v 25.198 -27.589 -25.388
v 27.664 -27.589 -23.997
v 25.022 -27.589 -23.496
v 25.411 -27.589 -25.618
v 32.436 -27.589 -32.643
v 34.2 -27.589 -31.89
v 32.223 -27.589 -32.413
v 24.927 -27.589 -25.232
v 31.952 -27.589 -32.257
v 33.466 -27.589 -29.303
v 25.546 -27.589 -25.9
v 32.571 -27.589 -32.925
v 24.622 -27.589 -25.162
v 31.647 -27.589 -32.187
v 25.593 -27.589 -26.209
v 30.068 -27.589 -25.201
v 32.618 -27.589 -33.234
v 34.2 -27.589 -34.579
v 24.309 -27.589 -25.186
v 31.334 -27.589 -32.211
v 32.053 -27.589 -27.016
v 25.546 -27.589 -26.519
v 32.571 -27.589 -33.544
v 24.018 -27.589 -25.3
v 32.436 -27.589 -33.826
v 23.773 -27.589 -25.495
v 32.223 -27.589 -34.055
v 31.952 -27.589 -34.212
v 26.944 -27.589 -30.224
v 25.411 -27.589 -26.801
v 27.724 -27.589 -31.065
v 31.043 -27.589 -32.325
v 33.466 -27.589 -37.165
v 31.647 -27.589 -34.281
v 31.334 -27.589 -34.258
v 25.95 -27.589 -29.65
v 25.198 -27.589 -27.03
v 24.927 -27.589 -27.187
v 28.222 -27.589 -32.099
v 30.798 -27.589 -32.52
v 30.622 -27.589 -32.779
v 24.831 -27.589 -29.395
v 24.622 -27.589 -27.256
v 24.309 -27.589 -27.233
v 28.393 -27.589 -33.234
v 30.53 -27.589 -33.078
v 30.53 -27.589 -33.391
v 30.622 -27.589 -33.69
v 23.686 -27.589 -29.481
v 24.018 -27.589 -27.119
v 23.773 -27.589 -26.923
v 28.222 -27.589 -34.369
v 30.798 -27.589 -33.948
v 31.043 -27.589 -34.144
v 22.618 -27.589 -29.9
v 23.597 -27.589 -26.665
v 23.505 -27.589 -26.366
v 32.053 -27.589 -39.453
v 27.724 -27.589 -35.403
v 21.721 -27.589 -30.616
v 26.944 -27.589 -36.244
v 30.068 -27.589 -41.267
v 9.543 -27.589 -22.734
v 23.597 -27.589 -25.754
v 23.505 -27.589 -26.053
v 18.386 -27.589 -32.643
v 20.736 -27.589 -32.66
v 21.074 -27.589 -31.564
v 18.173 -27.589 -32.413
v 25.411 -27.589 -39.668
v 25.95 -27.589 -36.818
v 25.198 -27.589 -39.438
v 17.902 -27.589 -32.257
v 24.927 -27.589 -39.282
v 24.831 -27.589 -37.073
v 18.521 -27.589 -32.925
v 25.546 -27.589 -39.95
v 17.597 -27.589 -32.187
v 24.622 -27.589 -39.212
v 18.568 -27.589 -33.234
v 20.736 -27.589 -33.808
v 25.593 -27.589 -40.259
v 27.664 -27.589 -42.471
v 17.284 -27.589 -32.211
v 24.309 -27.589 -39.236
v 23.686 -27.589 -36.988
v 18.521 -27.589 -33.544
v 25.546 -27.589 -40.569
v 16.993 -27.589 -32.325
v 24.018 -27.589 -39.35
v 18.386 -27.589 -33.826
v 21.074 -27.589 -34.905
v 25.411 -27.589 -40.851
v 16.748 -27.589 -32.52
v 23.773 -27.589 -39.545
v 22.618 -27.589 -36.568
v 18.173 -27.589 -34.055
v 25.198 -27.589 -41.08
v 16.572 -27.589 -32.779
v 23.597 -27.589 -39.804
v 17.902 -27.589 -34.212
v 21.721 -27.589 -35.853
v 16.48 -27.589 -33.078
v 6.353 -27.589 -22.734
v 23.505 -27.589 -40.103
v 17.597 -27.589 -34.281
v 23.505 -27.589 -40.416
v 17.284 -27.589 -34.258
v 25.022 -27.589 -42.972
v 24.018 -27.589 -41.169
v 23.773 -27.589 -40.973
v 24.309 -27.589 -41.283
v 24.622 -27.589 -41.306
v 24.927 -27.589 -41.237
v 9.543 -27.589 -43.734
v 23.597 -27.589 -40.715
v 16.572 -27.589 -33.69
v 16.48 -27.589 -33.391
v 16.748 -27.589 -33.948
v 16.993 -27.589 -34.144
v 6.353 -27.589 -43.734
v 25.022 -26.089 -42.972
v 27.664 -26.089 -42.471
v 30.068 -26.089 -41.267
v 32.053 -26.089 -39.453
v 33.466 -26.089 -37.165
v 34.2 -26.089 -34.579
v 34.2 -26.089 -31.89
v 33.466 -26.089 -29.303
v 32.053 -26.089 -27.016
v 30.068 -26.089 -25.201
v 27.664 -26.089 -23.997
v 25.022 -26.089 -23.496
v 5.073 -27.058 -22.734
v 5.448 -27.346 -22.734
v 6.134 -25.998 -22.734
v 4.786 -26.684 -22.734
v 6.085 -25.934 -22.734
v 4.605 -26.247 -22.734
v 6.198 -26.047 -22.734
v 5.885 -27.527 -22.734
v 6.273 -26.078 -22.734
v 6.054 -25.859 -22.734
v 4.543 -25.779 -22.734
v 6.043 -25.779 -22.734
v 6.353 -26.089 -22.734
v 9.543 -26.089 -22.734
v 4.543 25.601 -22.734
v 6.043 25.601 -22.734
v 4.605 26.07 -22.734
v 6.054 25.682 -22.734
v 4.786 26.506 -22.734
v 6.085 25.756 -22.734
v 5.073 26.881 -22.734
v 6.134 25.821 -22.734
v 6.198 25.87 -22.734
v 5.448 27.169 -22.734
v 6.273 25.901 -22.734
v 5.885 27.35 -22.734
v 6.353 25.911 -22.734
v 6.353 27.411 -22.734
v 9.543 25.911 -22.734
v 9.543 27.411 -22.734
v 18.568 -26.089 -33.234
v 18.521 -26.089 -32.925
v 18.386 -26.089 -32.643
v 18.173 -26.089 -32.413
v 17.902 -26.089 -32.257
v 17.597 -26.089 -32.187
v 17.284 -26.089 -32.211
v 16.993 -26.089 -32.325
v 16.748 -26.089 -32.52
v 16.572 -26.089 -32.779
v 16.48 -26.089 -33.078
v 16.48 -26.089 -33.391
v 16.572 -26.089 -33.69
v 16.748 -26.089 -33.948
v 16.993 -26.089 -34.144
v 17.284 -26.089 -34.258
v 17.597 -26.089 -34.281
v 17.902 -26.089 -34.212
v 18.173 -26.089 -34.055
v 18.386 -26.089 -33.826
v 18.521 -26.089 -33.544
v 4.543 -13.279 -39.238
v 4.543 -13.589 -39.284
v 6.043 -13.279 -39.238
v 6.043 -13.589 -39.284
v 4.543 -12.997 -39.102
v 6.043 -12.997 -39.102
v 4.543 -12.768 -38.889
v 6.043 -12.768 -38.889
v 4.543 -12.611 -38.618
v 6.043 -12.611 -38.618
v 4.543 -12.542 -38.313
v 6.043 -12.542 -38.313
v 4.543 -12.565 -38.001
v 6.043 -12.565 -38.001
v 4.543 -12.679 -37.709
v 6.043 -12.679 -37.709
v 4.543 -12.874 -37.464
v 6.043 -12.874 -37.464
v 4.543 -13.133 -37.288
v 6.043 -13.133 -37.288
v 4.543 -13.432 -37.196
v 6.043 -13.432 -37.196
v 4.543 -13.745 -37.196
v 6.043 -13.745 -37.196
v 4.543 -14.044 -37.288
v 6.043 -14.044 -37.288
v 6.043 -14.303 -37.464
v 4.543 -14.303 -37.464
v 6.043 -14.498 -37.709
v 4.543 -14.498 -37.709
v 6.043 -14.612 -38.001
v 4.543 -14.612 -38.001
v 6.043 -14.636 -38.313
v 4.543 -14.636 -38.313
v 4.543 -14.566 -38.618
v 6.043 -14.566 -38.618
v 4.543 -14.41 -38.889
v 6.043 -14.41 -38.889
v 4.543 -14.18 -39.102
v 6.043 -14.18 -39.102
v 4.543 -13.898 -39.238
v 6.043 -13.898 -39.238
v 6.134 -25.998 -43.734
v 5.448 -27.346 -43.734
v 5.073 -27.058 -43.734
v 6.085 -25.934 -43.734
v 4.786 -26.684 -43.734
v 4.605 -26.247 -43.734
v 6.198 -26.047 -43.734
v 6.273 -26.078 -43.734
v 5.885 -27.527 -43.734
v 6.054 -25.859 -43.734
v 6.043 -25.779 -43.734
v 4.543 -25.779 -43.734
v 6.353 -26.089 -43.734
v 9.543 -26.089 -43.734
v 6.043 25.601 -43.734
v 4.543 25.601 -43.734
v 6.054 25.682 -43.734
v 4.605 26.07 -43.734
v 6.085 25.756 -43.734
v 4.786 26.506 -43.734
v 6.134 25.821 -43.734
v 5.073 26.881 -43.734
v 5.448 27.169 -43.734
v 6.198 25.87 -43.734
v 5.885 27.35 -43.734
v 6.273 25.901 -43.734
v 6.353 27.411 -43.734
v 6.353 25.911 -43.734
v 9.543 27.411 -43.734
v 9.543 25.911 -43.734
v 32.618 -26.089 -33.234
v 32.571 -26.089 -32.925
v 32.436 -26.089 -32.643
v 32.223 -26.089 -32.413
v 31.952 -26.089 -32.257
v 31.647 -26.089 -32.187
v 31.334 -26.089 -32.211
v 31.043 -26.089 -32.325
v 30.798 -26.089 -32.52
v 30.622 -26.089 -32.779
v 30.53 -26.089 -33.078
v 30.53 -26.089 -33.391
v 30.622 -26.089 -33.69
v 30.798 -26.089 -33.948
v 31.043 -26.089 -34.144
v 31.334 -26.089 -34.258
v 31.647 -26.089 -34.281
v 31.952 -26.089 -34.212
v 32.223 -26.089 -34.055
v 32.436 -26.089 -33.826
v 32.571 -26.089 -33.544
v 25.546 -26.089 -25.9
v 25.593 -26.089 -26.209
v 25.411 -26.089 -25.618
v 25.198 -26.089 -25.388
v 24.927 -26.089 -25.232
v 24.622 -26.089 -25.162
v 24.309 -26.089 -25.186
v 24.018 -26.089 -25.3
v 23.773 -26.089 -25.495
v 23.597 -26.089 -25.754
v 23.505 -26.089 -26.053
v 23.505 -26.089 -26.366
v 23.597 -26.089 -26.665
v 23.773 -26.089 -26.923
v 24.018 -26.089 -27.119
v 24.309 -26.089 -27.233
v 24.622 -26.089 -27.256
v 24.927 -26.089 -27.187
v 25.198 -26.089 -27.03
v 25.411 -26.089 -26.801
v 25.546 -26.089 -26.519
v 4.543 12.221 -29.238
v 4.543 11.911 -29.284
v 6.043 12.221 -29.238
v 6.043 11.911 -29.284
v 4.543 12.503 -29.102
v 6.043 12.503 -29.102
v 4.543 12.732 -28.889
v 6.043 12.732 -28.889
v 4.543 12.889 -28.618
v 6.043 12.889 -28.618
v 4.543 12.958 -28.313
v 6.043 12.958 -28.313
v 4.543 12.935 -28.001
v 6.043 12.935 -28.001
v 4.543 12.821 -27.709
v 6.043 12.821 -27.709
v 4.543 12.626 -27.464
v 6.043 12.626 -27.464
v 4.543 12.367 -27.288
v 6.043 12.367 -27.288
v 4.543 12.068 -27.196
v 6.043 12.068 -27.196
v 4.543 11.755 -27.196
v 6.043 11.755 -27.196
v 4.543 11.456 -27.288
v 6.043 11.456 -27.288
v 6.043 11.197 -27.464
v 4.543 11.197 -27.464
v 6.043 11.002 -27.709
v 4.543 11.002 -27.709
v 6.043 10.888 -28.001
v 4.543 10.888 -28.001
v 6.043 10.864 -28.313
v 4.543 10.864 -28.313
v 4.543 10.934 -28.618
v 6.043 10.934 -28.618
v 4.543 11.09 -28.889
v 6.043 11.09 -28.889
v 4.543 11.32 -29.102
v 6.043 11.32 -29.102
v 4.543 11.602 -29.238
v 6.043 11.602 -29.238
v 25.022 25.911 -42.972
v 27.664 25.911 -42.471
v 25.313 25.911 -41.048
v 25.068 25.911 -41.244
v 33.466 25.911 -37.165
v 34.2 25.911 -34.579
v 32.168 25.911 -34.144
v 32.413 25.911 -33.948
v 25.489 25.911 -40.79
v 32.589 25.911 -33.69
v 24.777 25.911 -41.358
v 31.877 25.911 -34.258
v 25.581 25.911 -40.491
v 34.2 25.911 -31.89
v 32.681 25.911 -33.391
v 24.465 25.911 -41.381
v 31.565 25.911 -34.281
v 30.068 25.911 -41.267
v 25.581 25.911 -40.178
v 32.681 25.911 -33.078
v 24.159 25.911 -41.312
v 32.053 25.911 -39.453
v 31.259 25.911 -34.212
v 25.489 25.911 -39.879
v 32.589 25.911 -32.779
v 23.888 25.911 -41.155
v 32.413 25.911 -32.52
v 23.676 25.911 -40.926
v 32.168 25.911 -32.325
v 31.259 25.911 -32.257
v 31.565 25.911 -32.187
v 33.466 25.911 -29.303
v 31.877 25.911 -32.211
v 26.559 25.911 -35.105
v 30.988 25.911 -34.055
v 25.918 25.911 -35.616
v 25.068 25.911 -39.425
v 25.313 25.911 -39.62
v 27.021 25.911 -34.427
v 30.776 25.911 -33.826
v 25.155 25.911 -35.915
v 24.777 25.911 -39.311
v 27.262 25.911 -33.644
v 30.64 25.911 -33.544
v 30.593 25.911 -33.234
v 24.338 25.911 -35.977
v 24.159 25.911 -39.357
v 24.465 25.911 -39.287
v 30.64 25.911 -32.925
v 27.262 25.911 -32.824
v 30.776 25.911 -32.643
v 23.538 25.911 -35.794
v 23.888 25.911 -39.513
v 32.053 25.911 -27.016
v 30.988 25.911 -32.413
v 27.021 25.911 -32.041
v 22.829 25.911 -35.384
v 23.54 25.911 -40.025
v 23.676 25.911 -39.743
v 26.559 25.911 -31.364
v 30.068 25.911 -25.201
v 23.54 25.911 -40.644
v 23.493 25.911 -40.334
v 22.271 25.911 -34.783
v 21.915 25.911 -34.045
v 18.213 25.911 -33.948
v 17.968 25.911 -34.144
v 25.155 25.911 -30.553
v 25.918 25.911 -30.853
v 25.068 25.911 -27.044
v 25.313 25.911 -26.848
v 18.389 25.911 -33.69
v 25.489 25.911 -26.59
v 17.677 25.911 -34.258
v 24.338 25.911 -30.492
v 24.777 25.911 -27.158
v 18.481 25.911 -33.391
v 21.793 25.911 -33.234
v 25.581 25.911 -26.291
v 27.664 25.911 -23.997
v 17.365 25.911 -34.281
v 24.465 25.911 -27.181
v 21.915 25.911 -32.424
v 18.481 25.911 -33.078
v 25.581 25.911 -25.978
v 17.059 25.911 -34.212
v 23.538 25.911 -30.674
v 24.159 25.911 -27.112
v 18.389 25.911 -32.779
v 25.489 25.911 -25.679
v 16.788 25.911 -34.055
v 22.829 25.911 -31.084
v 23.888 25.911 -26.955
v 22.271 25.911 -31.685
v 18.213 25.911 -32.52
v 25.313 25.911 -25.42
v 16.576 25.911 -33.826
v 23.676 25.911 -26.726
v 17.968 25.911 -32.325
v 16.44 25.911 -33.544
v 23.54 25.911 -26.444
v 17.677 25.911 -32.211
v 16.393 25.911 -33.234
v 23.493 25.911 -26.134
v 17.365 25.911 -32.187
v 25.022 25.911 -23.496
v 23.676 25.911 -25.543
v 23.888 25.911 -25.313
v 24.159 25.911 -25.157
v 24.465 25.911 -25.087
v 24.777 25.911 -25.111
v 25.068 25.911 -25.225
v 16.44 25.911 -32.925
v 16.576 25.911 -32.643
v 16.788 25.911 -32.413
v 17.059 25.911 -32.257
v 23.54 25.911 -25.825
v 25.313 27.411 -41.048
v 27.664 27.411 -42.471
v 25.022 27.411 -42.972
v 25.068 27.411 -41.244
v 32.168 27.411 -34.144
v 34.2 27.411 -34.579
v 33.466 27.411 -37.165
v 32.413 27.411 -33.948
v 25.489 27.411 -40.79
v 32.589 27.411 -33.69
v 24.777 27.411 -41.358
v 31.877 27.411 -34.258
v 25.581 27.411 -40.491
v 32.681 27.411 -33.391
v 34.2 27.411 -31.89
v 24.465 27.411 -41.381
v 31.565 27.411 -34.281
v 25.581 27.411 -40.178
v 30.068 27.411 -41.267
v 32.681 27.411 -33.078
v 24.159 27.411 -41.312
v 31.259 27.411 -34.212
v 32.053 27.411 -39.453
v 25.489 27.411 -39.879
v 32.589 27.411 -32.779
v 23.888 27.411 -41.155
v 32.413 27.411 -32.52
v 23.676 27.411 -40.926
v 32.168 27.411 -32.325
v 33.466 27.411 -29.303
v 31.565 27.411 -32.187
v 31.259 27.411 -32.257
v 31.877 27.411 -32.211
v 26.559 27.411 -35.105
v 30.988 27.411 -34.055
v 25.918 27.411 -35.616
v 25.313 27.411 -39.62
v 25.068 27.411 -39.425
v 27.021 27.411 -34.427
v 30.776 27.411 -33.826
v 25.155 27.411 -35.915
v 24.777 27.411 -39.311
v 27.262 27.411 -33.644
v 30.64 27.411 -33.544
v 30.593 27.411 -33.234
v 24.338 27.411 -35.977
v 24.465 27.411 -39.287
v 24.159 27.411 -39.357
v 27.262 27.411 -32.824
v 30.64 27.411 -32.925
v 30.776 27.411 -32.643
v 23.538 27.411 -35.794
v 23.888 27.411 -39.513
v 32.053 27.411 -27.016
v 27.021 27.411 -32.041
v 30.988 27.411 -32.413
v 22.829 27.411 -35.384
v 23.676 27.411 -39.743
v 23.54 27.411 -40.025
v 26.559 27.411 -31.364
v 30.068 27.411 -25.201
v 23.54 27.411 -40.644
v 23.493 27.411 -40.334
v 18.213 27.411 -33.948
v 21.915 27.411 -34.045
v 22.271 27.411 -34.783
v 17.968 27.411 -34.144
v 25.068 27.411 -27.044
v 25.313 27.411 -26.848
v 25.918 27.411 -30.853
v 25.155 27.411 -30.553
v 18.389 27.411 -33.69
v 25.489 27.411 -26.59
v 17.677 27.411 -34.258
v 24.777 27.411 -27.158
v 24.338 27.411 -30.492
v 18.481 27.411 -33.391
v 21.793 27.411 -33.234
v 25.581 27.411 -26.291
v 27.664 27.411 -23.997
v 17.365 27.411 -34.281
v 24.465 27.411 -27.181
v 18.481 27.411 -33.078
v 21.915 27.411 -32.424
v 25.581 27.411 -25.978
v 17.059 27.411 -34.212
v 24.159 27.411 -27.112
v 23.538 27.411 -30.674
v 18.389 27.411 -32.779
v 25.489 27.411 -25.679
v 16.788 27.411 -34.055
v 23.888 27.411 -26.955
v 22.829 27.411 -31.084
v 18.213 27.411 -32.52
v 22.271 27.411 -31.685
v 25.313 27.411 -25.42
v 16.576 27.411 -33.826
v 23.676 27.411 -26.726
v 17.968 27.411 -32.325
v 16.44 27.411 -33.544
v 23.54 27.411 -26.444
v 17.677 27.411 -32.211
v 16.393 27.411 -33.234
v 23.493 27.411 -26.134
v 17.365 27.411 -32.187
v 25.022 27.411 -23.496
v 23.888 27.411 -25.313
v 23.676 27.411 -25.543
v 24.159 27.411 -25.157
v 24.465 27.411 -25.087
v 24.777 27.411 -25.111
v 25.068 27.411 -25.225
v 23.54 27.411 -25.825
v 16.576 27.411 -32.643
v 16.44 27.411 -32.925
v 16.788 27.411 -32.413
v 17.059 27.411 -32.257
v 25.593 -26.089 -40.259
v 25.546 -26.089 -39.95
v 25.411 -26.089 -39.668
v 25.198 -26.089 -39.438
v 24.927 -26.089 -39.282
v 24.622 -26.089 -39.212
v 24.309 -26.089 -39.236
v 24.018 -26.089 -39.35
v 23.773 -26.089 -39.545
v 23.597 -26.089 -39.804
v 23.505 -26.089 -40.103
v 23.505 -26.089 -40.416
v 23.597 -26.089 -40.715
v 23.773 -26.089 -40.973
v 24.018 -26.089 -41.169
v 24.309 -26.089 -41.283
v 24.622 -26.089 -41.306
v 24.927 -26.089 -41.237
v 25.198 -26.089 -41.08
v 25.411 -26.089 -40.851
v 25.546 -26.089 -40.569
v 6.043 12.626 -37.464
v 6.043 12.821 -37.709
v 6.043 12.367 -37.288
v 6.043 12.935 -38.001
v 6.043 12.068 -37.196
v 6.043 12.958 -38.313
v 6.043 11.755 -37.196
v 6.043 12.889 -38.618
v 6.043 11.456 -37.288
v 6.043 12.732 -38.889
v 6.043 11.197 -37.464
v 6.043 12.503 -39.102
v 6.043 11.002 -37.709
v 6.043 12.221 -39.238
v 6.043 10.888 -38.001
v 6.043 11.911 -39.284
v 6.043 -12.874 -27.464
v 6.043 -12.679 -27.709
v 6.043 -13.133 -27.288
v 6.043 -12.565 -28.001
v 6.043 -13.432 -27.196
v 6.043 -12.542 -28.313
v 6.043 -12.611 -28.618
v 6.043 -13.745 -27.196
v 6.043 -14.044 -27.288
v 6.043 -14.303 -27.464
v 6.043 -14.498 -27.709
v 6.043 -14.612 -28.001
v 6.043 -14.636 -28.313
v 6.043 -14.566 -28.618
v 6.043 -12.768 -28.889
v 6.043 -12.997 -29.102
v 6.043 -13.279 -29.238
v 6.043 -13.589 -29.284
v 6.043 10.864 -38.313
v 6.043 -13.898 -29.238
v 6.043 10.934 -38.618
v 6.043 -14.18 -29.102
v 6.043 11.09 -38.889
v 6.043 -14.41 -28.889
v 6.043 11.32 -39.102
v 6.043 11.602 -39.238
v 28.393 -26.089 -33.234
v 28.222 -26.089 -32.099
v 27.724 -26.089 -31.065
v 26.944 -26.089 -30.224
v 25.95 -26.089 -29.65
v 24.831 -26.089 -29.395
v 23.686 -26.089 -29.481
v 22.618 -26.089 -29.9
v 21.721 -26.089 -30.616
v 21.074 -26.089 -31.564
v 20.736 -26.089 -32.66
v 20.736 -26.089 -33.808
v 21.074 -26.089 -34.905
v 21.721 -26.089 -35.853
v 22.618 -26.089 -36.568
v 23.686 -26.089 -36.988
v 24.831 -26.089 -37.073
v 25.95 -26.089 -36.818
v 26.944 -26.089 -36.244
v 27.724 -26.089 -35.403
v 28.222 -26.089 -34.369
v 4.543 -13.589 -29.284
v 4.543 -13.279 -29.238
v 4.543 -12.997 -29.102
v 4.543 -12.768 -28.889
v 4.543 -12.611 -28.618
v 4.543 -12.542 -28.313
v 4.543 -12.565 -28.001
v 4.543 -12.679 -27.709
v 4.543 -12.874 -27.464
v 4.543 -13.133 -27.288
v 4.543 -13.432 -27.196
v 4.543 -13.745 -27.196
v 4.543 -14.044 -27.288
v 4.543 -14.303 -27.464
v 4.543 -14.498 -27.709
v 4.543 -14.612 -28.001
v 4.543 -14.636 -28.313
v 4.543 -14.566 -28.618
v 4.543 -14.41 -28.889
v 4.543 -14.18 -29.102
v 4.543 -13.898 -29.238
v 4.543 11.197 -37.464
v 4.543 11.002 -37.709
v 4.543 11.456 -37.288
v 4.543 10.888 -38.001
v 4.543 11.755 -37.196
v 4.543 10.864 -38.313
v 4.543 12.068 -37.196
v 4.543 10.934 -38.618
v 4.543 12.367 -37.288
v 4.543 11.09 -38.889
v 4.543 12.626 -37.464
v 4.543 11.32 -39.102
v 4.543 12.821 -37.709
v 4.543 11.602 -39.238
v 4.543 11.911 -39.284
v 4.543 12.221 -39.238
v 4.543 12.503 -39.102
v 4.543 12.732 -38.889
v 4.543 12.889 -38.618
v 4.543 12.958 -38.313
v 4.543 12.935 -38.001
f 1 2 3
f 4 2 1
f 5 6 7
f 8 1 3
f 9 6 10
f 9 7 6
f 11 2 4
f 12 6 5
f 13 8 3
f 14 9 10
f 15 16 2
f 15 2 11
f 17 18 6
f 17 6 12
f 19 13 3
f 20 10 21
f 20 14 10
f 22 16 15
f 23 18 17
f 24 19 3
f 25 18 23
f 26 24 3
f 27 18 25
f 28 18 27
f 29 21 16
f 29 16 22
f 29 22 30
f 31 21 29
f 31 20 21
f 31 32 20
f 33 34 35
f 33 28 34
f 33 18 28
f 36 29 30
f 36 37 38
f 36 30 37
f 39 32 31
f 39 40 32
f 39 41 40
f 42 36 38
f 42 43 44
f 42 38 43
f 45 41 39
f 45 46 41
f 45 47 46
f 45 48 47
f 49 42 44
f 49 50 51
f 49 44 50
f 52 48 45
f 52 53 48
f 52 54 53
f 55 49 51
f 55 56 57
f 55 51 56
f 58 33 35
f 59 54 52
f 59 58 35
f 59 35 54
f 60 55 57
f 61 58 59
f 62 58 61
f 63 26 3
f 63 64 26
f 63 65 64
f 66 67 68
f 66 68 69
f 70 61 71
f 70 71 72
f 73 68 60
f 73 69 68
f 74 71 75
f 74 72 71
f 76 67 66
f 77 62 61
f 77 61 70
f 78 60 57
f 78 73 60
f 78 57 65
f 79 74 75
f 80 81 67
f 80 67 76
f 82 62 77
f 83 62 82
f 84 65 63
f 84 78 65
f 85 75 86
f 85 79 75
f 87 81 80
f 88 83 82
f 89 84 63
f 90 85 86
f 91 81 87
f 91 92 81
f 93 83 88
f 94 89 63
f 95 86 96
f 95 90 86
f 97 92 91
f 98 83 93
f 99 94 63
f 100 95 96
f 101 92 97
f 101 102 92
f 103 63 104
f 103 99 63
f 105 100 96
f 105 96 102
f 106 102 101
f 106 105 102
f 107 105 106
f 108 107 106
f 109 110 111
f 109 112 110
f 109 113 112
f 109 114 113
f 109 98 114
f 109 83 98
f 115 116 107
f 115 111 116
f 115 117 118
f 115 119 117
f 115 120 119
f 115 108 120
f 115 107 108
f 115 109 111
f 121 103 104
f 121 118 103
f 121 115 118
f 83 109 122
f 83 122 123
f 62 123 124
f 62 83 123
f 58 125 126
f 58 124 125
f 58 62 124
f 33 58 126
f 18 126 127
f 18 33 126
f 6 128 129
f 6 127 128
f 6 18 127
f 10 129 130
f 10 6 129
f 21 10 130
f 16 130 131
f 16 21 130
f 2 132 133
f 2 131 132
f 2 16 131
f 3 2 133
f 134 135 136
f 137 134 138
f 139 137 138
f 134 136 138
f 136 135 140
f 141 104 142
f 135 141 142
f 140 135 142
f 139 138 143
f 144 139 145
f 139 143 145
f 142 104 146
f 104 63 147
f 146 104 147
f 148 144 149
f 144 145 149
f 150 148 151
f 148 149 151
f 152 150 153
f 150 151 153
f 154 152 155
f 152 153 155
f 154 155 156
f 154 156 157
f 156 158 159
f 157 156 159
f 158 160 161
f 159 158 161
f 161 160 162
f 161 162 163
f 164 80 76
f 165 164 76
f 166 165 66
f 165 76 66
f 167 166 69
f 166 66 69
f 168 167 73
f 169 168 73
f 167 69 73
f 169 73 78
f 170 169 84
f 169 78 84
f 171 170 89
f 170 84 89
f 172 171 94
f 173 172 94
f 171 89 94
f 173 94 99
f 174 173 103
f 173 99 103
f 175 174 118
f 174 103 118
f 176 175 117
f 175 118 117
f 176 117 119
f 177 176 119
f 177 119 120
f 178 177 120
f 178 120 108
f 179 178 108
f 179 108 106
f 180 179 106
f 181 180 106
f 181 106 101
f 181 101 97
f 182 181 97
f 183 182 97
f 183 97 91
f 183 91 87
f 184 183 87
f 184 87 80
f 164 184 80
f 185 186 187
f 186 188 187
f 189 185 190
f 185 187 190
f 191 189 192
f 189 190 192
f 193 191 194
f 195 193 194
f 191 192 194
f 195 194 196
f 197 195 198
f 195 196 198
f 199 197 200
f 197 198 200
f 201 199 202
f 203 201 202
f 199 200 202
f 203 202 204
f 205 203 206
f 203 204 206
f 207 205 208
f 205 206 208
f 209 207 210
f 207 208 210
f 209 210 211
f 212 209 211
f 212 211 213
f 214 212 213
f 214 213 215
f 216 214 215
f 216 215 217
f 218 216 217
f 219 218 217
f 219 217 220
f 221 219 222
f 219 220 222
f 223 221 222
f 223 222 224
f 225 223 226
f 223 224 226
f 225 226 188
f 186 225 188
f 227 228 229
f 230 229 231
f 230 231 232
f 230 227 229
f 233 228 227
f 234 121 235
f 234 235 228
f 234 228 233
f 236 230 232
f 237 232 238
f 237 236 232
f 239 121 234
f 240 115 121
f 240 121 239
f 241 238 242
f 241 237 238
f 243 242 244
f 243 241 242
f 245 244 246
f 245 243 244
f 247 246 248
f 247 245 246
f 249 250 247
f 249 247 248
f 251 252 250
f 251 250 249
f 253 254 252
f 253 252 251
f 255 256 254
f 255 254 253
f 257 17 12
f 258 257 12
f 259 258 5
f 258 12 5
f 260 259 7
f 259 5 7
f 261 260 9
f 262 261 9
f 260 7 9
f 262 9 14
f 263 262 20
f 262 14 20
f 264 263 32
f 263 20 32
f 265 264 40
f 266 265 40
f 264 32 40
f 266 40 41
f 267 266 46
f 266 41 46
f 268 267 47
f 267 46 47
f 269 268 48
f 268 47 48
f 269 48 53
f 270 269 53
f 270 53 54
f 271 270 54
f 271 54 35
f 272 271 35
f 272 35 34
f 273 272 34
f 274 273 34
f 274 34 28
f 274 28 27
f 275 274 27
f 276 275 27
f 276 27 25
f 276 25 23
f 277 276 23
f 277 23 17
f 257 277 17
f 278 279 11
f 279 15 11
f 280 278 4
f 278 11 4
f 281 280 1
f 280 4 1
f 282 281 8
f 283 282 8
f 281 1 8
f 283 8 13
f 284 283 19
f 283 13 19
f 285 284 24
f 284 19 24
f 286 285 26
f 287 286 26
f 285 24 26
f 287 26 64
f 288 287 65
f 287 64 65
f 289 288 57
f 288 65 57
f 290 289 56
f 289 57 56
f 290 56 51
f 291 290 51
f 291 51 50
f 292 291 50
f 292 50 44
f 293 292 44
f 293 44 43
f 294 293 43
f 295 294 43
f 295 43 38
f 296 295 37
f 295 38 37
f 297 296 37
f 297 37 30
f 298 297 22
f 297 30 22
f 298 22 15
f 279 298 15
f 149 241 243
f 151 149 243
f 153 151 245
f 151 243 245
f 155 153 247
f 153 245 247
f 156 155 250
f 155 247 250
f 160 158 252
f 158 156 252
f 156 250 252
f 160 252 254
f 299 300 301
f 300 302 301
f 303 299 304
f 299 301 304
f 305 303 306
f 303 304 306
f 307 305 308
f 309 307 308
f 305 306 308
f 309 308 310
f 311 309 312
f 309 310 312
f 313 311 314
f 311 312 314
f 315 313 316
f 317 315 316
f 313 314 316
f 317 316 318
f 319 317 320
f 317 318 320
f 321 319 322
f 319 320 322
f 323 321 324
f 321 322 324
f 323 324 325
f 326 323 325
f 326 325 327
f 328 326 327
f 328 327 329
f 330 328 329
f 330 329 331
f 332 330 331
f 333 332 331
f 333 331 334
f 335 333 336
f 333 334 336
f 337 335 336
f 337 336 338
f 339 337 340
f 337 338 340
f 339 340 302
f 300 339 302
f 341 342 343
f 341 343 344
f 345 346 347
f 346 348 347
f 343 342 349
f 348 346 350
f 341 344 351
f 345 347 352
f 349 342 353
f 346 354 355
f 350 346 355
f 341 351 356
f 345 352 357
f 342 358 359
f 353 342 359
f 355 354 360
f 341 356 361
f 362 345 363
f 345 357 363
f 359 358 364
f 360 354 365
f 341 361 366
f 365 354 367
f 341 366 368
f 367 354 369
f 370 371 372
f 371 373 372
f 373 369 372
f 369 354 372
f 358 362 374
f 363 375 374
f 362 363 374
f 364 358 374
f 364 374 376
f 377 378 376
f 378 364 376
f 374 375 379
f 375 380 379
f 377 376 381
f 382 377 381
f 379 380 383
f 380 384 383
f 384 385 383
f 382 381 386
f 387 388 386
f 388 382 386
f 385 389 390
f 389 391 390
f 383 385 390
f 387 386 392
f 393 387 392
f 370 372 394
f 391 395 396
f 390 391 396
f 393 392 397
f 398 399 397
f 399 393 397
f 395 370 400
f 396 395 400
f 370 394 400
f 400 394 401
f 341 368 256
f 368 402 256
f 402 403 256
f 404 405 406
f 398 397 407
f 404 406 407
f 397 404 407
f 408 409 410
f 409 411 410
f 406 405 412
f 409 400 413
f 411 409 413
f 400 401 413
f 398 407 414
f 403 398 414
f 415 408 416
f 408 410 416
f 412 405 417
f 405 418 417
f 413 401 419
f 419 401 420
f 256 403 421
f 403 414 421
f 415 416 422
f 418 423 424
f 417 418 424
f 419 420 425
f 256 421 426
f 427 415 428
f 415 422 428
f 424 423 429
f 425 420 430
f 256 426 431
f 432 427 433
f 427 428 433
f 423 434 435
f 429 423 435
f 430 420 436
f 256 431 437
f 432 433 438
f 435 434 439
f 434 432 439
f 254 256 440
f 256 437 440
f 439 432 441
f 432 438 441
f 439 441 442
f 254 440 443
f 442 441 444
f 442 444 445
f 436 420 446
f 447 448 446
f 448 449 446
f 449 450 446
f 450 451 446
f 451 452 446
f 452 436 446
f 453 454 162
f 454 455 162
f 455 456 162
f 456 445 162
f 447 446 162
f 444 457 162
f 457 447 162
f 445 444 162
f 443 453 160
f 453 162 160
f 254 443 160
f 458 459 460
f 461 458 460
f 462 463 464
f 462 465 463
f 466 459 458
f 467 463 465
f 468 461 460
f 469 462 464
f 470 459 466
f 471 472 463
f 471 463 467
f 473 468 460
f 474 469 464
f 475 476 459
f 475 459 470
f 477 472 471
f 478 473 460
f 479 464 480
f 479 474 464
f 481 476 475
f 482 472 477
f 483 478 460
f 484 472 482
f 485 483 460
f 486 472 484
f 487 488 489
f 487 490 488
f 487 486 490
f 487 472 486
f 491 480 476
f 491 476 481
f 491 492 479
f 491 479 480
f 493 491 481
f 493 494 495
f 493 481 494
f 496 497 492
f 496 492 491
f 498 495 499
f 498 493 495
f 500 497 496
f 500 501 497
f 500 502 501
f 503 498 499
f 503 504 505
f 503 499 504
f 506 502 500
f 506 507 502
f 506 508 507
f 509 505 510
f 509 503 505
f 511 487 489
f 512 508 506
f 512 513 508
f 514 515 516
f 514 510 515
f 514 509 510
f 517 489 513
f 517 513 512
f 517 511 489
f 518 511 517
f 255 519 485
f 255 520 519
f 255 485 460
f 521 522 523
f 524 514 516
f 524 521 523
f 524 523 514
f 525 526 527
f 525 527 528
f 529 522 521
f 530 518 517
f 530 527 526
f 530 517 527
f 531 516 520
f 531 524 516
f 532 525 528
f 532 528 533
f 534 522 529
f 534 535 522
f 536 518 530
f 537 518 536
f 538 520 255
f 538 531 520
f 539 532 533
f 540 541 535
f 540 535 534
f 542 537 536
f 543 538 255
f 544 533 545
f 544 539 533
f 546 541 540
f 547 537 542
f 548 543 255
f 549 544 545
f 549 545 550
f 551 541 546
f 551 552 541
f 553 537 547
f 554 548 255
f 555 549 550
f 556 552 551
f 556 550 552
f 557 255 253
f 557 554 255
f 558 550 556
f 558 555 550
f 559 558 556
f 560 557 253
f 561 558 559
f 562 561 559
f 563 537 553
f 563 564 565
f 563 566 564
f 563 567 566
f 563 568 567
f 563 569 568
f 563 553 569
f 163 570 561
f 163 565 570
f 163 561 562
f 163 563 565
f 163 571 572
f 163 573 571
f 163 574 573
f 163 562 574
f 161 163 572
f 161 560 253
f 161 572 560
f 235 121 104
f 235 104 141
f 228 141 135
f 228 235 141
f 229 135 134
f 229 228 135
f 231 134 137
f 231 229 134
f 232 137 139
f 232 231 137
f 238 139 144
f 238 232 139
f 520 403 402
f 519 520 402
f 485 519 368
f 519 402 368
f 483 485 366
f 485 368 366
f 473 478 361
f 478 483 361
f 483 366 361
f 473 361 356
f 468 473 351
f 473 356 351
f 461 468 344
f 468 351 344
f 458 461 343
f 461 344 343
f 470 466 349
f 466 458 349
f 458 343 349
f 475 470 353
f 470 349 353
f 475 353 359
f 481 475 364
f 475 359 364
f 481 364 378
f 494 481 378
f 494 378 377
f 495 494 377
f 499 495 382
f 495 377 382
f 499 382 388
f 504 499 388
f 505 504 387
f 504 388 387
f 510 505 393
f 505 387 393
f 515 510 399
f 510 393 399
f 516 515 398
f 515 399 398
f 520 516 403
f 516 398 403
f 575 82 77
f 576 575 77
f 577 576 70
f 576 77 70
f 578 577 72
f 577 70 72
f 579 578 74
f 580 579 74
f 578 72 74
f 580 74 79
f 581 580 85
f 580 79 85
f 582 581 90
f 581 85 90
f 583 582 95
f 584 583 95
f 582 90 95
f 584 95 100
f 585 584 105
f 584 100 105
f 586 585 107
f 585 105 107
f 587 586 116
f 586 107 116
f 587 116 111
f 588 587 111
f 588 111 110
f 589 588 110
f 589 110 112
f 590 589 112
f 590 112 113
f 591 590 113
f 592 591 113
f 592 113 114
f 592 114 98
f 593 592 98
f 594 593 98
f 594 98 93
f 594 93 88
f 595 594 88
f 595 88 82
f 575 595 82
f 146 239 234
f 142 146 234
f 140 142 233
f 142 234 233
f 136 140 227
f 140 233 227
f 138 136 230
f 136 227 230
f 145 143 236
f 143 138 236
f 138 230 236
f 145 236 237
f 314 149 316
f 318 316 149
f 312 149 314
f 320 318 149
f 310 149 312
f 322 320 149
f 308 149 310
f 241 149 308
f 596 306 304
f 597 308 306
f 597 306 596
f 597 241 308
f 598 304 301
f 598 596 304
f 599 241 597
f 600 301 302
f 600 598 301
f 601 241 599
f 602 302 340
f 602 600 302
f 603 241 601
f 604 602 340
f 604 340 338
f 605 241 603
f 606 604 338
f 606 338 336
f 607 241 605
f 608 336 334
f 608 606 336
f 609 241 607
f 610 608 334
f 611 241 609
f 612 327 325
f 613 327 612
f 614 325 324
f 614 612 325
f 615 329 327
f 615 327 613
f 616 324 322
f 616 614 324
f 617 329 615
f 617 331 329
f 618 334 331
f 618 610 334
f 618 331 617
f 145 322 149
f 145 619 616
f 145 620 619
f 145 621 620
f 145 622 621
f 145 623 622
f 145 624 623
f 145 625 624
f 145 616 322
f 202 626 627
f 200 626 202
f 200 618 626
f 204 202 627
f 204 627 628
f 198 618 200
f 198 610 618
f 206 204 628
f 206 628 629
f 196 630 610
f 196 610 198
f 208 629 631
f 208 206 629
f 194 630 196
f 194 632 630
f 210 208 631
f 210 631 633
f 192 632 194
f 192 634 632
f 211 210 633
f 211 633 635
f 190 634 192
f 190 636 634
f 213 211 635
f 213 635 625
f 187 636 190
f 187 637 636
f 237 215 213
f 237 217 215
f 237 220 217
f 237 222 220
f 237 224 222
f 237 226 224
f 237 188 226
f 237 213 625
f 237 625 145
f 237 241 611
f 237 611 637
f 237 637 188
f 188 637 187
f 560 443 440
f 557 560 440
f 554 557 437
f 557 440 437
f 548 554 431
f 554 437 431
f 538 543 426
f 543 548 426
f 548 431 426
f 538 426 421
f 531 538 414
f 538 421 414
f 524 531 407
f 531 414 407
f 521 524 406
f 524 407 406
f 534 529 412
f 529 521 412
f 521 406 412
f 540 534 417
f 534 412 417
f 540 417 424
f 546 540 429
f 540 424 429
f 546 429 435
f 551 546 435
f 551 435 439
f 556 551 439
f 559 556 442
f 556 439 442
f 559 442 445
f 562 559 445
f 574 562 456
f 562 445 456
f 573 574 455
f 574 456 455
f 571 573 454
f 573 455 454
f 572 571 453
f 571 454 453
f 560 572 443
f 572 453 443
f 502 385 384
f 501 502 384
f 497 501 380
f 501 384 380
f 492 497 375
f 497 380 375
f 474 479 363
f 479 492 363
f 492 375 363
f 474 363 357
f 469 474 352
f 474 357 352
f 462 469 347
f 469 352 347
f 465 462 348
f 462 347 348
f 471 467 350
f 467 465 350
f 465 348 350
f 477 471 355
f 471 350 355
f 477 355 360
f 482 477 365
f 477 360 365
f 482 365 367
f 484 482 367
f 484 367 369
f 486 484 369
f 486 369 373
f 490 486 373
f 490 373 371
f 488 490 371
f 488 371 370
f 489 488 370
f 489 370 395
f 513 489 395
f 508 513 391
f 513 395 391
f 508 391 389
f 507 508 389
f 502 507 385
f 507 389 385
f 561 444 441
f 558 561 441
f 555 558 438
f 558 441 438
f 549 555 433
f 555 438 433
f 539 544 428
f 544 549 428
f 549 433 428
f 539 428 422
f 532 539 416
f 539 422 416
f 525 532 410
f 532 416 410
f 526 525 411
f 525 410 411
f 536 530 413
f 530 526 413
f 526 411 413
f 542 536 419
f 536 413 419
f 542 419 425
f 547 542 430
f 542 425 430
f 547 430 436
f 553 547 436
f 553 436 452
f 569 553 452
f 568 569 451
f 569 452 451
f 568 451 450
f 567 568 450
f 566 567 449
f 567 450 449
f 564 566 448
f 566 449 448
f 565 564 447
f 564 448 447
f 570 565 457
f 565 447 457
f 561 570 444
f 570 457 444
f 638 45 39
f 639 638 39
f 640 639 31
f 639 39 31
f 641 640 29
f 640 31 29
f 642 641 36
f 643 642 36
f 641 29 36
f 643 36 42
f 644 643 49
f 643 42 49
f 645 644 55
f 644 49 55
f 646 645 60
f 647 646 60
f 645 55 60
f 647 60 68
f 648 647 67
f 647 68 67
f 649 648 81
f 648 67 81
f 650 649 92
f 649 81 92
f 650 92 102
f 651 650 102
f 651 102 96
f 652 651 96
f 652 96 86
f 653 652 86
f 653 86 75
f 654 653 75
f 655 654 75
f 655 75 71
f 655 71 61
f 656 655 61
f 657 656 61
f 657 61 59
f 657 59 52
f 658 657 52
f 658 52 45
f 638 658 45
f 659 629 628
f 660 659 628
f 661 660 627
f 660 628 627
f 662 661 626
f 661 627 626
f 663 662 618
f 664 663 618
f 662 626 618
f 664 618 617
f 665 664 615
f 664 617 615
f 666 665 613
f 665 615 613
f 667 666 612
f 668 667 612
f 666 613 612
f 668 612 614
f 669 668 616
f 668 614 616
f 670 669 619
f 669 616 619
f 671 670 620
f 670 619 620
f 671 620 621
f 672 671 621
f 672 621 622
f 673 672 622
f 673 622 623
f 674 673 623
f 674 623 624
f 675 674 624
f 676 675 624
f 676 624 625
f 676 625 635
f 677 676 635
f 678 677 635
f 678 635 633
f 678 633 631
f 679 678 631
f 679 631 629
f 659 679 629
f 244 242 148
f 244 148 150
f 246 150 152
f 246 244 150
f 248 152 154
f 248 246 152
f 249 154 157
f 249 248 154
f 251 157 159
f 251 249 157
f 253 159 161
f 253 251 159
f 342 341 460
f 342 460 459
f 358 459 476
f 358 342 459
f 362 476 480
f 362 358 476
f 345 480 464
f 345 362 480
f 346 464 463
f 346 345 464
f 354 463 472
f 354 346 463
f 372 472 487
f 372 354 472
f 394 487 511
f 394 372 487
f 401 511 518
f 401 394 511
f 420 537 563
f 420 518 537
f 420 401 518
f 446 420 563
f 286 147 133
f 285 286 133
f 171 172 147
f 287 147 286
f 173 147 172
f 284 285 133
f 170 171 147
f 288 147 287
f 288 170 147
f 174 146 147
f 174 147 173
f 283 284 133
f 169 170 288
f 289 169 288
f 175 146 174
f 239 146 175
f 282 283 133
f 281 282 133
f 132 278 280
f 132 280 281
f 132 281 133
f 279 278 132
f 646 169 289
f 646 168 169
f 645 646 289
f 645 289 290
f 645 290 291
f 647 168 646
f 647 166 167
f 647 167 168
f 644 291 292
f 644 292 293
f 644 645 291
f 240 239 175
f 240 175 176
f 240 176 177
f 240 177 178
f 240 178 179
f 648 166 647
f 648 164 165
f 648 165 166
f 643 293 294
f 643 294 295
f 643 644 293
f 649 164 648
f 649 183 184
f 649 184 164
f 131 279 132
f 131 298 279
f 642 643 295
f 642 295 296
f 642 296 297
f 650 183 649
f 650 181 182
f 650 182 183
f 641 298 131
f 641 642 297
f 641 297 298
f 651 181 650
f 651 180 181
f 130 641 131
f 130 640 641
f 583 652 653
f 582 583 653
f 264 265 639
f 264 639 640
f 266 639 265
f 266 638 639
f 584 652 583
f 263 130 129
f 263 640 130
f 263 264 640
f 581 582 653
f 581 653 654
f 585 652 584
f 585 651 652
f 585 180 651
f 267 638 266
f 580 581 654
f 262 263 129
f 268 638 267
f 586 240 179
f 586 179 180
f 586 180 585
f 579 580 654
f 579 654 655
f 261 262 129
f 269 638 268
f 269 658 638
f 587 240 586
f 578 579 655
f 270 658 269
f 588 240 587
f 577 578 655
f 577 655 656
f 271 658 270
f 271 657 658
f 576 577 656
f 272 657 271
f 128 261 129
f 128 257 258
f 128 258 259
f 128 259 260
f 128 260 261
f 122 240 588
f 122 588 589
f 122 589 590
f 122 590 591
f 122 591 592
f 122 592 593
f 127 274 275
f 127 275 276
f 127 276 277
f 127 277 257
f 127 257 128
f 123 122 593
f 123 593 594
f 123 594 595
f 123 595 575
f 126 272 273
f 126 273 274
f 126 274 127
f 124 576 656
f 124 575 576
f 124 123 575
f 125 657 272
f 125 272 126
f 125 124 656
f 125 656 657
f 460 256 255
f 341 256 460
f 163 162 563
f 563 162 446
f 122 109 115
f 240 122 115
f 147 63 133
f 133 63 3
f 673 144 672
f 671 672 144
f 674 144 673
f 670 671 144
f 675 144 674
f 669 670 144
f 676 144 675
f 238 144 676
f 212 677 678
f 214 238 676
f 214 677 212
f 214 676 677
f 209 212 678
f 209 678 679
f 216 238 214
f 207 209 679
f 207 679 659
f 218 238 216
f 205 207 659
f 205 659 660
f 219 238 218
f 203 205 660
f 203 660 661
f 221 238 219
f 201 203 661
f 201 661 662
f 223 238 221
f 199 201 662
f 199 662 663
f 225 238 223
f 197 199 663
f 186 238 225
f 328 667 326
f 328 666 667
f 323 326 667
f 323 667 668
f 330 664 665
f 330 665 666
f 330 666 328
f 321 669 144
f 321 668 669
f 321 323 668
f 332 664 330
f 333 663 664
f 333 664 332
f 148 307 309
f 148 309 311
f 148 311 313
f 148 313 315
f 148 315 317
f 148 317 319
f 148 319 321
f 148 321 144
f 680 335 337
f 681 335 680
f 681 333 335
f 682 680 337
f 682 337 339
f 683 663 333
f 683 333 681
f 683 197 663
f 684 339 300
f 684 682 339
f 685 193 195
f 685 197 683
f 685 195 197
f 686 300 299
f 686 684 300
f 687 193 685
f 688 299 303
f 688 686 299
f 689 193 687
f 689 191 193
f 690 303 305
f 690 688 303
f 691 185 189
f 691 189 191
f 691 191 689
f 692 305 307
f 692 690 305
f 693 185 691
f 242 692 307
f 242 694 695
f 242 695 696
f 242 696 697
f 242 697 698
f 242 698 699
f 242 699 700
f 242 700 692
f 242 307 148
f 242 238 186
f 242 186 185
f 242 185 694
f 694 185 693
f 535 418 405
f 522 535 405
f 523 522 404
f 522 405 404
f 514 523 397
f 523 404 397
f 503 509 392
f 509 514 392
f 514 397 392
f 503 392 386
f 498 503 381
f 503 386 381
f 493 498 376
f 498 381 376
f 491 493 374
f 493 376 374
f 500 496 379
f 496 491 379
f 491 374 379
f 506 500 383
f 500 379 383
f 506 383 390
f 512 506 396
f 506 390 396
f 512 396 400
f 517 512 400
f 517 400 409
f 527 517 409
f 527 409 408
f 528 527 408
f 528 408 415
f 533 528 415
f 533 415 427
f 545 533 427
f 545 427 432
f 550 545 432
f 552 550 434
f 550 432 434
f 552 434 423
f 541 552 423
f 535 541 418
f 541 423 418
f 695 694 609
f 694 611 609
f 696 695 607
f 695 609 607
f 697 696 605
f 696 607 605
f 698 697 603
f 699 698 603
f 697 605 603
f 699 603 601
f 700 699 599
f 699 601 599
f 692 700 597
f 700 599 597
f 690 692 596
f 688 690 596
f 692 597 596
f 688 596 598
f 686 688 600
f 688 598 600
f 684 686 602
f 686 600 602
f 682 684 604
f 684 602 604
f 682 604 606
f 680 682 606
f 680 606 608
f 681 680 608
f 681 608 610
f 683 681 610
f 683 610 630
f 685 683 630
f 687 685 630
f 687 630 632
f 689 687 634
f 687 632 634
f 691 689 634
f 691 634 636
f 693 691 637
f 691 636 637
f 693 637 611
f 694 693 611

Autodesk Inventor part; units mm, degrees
ref_plane "YZ Plane" through (0, 0, 0) normal (1, 0, 0) x (0, 1, 0)
ref_plane "Work Plane1" through (34.2931, 25.9114, -33.2342) normal (0, 1, 0) x (-1, 0, 0)
sketch "Sketch2" plane through (34.2931, 25.9114, -33.2342) normal (0, 1, 0) x (-1, 0, 0)
  circle A0 centre (9.75, 7.1) radius 0.7835
  circle A1 centre (16.85, 0) radius 0.7835
  circle A2 centre (9.75, -7.1) radius 0.7835
  circle A3 centre (2.65, 0) radius 0.7835
  circle A4 centre (4.7295, -5.0205) radius 0.7835
  circle A5 centre (14.7705, -5.0205) radius 0.7835
  circle A6 centre (14.7705, 5.0205) radius 0.7835
  circle A7 centre (4.7295, 5.0205) radius 0.7835
  circle A8 centre (9.75, 0) radius 3.8
  circle A9 centre (9.75, 0) radius 9.75
  circle A10 centre (9.75, 0) radius 2.75
  line L0 (29.75, -10.5) -> (29.75, 10.5)
  line L1 (29.75, -10.5) -> (24.75, -10.5)
  line L2 (29.75, 10.5) -> (24.75, 10.5)
  line L3 (24.75, -10.5) -> (9.2707, -9.7382)
  line L4 (24.75, 10.5) -> (9.2707, 9.7382)
  circle A11 centre (9.75, -7.1) radius 1.05
  circle A12 centre (16.85, 0) radius 1.05
  circle A13 centre (9.75, 7.1) radius 1.05
  circle A14 centre (2.65, 0) radius 1.05
  point P0 (34.2931, 33.2342)
  point P1 (29.75, 0)
  dimension "d2" = 5.5
  dimension "d4" = 21
  dimension "d5" = 5
  dimension "d6" = 20
  dimension "d36" = 2.1
extrude "Plate2" add sketch "Sketch2" along normal blind 1.5 contours A4 | A5 | A6 | A7 | A8 | A9 | A9 L4 L2 L0 L1 L3
sketch "Sketch3" plane through (6.0431, 27.4114, -43.7342) normal (-1, 0, 0) x (0, -1, 0)
  line L0 (0, 21) -> (0, 0)
  line L1 (0, 0) -> (55, 0)
  line L2 (55, 0) -> (55, 21)
  line L3 (55, 21) -> (0, 21)
edge flange "Flange1" height 55 angle 90 thickness 1.5 bend radius 0.31 thickness toward (-1, 0, 0) relief tear relief width 1.5 relief depth 0.75 edges at (4.5431, 25.9114, -33.2342) wall of the first edge with corners at (6.0431, 27.4114, -22.7342) (6.0431, 27.4114, -43.7342) (6.0431, -27.5886, -43.7342) (6.0431, -27.5886, -22.7342)
bend "Bend1"
corner "Corner1"
sketch "Sketch4" plane through (4.5431, -26.0886, -43.7342) normal (0, -1, 0) x (1, 0, 0)
  line L0 (0, 21) -> (0, 0)
  line L1 (0, 0) -> (30, 0)
  line L2 (30, 0) -> (30, 21)
  line L3 (30, 21) -> (0, 21)
edge flange "Flange2" height 30 angle 90 thickness 1.5 bend radius 0.31 thickness toward (0, -1, 0) relief tear relief width 1.5 relief depth 0.75 edges at (6.0431, -27.5886, -33.2342) wall of the first edge with corners at (4.5431, -26.0886, -22.7342) (4.5431, -26.0886, -43.7342) (34.5431, -26.0886, -43.7342) (34.5431, -26.0886, -22.7342)
bend "Bend2"
corner "Corner2"
sketch "Sketch5" plane through (34.5431, -27.5886, -43.7342) normal (0, -1, 0) x (1, 0, 0)
  circle A0 centre (-10, 10.5) radius 3.8 projected
  circle A1 centre (-10, 10.5) radius 3.85
  point P0 (-34.5431, 43.7342)
  dimension "d37" = 7.7
extrude "Cut1" cut sketch "Sketch5" against normal blind 1.5 contours A0 | A1
sketch "Sketch6" plane through (34.5431, -27.5886, -43.7342) normal (0, -1, 0) x (1, 0, 0)
  circle A0 centre (-10, 17.525) radius 0.7835 projected
  circle A1 centre (-2.975, 10.5) radius 0.7835 projected
  circle A2 centre (-10, 3.475) radius 0.7835 projected
  circle A3 centre (-17.025, 10.5) radius 0.7835 projected
  circle A4 centre (-10, 10.5) radius 9.75 projected
  line L0 (-25, 21) -> (-9.5207, 20.2382) projected
  line L1 (-9.5207, 0.7618) -> (-25, 0) projected
  line L2 (-28.19, 21) -> (0, 21) projected
  line L3 (0, 21) -> (0, 0) projected
  line L4 (0, 0) -> (-28.19, 0) projected
  line L5 (-28.19, 21) -> (-30, 21) projected
  line L6 (-30, 0) -> (-28.19, 0) projected
  circle A5 centre (-2.975, 10.5) radius 1.05
  circle A6 centre (-10, 17.525) radius 1.05
  circle A7 centre (-17.025, 10.5) radius 1.05
  circle A8 centre (-10, 3.475) radius 1.05
  point P0 (-34.5431, 43.7342)
  dimension "d35" = 2.1
extrude "Cut2" cut sketch "Sketch6" against normal blind 1.5 contours A0 | A1 | A2 | A3 | A4 L0 L2 L3 L4 L1 | A5 | A6 | A7 | A8
ref_plane "작업 평면2" through (4.5431, 25.6014, -33.2342) normal (0, 0, 1) x (1, 0, 0)
sketch "Sketch7" plane through (6.0431, 25.6014, -22.7342) normal (1, 0, 0) x (0, 0, -1)
  circle A0 centre (5.5, -13.69) radius 0.7835 projected
  circle A1 centre (15.5, -13.69) radius 0.7835 projected
  circle A2 centre (5.5, -39.19) radius 0.7835 projected
  circle A3 centre (15.5, -39.19) radius 0.7835 projected
  circle A4 centre (5.5, -13.69) radius 1.05
  circle A5 centre (15.5, -13.69) radius 1.05
  circle A6 centre (5.5, -39.19) radius 1.05
  circle A7 centre (15.5, -39.19) radius 1.05
  point P0 (-22.7342, -25.6014)
  dimension "d34" = 2.1
extrude "Cut3" cut sketch "Sketch7" against normal blind 1.5 contours A0 | A1 | A2 | A3 | A4 | A5 | A6 | A7
equation "\"d28\" = Thickness"
equation "\"d30\" = Thickness"
equation "\"d32\" = Thickness"
equation "\"d7\" = Thickness"
equation "\"d8\" = BendReliefWidth"
equation "\"d9\" = BendReliefDepth"
equation "\"d10\" = MinimumRemnant"
equation "\"d11\" = TransitionRadius"
equation "\"d14\" = BendRadius"
equation "\"d15\" = CornerReliefSize"
equation "\"d16\" = GapSize"
equation "\"d17\" = JacobiRadiusSize"
equation "\"d18\" = BendReliefWidth"
equation "\"d19\" = BendReliefDepth"
equation "\"d20\" = MinimumRemnant"
equation "\"d21\" = TransitionRadius"
equation "\"d24\" = BendRadius"
equation "\"d25\" = CornerReliefSize"
equation "\"d26\" = GapSize"
equation "\"d27\" = JacobiRadiusSize"
equation "\"BendReliefWidth\" = Thickness"
equation "\"BendReliefDepth\" = 0.5 * Thickness"
equation "\"CornerReliefSize\" = 4 * Thickness"
equation "\"MinimumRemnant\" = 2 * Thickness"
equation "\"TransitionRadius\" = BendRadius"
equation "\"JacobiRadiusSize\" = BendRadius"
equation "\"GapSize\" = Thickness"
equation "\"Thickness\" = 1.5"
equation "\"BendRadius\" = 0.31"
properties part number "ㄷ_frame_2" material "Aluminum 6061"
